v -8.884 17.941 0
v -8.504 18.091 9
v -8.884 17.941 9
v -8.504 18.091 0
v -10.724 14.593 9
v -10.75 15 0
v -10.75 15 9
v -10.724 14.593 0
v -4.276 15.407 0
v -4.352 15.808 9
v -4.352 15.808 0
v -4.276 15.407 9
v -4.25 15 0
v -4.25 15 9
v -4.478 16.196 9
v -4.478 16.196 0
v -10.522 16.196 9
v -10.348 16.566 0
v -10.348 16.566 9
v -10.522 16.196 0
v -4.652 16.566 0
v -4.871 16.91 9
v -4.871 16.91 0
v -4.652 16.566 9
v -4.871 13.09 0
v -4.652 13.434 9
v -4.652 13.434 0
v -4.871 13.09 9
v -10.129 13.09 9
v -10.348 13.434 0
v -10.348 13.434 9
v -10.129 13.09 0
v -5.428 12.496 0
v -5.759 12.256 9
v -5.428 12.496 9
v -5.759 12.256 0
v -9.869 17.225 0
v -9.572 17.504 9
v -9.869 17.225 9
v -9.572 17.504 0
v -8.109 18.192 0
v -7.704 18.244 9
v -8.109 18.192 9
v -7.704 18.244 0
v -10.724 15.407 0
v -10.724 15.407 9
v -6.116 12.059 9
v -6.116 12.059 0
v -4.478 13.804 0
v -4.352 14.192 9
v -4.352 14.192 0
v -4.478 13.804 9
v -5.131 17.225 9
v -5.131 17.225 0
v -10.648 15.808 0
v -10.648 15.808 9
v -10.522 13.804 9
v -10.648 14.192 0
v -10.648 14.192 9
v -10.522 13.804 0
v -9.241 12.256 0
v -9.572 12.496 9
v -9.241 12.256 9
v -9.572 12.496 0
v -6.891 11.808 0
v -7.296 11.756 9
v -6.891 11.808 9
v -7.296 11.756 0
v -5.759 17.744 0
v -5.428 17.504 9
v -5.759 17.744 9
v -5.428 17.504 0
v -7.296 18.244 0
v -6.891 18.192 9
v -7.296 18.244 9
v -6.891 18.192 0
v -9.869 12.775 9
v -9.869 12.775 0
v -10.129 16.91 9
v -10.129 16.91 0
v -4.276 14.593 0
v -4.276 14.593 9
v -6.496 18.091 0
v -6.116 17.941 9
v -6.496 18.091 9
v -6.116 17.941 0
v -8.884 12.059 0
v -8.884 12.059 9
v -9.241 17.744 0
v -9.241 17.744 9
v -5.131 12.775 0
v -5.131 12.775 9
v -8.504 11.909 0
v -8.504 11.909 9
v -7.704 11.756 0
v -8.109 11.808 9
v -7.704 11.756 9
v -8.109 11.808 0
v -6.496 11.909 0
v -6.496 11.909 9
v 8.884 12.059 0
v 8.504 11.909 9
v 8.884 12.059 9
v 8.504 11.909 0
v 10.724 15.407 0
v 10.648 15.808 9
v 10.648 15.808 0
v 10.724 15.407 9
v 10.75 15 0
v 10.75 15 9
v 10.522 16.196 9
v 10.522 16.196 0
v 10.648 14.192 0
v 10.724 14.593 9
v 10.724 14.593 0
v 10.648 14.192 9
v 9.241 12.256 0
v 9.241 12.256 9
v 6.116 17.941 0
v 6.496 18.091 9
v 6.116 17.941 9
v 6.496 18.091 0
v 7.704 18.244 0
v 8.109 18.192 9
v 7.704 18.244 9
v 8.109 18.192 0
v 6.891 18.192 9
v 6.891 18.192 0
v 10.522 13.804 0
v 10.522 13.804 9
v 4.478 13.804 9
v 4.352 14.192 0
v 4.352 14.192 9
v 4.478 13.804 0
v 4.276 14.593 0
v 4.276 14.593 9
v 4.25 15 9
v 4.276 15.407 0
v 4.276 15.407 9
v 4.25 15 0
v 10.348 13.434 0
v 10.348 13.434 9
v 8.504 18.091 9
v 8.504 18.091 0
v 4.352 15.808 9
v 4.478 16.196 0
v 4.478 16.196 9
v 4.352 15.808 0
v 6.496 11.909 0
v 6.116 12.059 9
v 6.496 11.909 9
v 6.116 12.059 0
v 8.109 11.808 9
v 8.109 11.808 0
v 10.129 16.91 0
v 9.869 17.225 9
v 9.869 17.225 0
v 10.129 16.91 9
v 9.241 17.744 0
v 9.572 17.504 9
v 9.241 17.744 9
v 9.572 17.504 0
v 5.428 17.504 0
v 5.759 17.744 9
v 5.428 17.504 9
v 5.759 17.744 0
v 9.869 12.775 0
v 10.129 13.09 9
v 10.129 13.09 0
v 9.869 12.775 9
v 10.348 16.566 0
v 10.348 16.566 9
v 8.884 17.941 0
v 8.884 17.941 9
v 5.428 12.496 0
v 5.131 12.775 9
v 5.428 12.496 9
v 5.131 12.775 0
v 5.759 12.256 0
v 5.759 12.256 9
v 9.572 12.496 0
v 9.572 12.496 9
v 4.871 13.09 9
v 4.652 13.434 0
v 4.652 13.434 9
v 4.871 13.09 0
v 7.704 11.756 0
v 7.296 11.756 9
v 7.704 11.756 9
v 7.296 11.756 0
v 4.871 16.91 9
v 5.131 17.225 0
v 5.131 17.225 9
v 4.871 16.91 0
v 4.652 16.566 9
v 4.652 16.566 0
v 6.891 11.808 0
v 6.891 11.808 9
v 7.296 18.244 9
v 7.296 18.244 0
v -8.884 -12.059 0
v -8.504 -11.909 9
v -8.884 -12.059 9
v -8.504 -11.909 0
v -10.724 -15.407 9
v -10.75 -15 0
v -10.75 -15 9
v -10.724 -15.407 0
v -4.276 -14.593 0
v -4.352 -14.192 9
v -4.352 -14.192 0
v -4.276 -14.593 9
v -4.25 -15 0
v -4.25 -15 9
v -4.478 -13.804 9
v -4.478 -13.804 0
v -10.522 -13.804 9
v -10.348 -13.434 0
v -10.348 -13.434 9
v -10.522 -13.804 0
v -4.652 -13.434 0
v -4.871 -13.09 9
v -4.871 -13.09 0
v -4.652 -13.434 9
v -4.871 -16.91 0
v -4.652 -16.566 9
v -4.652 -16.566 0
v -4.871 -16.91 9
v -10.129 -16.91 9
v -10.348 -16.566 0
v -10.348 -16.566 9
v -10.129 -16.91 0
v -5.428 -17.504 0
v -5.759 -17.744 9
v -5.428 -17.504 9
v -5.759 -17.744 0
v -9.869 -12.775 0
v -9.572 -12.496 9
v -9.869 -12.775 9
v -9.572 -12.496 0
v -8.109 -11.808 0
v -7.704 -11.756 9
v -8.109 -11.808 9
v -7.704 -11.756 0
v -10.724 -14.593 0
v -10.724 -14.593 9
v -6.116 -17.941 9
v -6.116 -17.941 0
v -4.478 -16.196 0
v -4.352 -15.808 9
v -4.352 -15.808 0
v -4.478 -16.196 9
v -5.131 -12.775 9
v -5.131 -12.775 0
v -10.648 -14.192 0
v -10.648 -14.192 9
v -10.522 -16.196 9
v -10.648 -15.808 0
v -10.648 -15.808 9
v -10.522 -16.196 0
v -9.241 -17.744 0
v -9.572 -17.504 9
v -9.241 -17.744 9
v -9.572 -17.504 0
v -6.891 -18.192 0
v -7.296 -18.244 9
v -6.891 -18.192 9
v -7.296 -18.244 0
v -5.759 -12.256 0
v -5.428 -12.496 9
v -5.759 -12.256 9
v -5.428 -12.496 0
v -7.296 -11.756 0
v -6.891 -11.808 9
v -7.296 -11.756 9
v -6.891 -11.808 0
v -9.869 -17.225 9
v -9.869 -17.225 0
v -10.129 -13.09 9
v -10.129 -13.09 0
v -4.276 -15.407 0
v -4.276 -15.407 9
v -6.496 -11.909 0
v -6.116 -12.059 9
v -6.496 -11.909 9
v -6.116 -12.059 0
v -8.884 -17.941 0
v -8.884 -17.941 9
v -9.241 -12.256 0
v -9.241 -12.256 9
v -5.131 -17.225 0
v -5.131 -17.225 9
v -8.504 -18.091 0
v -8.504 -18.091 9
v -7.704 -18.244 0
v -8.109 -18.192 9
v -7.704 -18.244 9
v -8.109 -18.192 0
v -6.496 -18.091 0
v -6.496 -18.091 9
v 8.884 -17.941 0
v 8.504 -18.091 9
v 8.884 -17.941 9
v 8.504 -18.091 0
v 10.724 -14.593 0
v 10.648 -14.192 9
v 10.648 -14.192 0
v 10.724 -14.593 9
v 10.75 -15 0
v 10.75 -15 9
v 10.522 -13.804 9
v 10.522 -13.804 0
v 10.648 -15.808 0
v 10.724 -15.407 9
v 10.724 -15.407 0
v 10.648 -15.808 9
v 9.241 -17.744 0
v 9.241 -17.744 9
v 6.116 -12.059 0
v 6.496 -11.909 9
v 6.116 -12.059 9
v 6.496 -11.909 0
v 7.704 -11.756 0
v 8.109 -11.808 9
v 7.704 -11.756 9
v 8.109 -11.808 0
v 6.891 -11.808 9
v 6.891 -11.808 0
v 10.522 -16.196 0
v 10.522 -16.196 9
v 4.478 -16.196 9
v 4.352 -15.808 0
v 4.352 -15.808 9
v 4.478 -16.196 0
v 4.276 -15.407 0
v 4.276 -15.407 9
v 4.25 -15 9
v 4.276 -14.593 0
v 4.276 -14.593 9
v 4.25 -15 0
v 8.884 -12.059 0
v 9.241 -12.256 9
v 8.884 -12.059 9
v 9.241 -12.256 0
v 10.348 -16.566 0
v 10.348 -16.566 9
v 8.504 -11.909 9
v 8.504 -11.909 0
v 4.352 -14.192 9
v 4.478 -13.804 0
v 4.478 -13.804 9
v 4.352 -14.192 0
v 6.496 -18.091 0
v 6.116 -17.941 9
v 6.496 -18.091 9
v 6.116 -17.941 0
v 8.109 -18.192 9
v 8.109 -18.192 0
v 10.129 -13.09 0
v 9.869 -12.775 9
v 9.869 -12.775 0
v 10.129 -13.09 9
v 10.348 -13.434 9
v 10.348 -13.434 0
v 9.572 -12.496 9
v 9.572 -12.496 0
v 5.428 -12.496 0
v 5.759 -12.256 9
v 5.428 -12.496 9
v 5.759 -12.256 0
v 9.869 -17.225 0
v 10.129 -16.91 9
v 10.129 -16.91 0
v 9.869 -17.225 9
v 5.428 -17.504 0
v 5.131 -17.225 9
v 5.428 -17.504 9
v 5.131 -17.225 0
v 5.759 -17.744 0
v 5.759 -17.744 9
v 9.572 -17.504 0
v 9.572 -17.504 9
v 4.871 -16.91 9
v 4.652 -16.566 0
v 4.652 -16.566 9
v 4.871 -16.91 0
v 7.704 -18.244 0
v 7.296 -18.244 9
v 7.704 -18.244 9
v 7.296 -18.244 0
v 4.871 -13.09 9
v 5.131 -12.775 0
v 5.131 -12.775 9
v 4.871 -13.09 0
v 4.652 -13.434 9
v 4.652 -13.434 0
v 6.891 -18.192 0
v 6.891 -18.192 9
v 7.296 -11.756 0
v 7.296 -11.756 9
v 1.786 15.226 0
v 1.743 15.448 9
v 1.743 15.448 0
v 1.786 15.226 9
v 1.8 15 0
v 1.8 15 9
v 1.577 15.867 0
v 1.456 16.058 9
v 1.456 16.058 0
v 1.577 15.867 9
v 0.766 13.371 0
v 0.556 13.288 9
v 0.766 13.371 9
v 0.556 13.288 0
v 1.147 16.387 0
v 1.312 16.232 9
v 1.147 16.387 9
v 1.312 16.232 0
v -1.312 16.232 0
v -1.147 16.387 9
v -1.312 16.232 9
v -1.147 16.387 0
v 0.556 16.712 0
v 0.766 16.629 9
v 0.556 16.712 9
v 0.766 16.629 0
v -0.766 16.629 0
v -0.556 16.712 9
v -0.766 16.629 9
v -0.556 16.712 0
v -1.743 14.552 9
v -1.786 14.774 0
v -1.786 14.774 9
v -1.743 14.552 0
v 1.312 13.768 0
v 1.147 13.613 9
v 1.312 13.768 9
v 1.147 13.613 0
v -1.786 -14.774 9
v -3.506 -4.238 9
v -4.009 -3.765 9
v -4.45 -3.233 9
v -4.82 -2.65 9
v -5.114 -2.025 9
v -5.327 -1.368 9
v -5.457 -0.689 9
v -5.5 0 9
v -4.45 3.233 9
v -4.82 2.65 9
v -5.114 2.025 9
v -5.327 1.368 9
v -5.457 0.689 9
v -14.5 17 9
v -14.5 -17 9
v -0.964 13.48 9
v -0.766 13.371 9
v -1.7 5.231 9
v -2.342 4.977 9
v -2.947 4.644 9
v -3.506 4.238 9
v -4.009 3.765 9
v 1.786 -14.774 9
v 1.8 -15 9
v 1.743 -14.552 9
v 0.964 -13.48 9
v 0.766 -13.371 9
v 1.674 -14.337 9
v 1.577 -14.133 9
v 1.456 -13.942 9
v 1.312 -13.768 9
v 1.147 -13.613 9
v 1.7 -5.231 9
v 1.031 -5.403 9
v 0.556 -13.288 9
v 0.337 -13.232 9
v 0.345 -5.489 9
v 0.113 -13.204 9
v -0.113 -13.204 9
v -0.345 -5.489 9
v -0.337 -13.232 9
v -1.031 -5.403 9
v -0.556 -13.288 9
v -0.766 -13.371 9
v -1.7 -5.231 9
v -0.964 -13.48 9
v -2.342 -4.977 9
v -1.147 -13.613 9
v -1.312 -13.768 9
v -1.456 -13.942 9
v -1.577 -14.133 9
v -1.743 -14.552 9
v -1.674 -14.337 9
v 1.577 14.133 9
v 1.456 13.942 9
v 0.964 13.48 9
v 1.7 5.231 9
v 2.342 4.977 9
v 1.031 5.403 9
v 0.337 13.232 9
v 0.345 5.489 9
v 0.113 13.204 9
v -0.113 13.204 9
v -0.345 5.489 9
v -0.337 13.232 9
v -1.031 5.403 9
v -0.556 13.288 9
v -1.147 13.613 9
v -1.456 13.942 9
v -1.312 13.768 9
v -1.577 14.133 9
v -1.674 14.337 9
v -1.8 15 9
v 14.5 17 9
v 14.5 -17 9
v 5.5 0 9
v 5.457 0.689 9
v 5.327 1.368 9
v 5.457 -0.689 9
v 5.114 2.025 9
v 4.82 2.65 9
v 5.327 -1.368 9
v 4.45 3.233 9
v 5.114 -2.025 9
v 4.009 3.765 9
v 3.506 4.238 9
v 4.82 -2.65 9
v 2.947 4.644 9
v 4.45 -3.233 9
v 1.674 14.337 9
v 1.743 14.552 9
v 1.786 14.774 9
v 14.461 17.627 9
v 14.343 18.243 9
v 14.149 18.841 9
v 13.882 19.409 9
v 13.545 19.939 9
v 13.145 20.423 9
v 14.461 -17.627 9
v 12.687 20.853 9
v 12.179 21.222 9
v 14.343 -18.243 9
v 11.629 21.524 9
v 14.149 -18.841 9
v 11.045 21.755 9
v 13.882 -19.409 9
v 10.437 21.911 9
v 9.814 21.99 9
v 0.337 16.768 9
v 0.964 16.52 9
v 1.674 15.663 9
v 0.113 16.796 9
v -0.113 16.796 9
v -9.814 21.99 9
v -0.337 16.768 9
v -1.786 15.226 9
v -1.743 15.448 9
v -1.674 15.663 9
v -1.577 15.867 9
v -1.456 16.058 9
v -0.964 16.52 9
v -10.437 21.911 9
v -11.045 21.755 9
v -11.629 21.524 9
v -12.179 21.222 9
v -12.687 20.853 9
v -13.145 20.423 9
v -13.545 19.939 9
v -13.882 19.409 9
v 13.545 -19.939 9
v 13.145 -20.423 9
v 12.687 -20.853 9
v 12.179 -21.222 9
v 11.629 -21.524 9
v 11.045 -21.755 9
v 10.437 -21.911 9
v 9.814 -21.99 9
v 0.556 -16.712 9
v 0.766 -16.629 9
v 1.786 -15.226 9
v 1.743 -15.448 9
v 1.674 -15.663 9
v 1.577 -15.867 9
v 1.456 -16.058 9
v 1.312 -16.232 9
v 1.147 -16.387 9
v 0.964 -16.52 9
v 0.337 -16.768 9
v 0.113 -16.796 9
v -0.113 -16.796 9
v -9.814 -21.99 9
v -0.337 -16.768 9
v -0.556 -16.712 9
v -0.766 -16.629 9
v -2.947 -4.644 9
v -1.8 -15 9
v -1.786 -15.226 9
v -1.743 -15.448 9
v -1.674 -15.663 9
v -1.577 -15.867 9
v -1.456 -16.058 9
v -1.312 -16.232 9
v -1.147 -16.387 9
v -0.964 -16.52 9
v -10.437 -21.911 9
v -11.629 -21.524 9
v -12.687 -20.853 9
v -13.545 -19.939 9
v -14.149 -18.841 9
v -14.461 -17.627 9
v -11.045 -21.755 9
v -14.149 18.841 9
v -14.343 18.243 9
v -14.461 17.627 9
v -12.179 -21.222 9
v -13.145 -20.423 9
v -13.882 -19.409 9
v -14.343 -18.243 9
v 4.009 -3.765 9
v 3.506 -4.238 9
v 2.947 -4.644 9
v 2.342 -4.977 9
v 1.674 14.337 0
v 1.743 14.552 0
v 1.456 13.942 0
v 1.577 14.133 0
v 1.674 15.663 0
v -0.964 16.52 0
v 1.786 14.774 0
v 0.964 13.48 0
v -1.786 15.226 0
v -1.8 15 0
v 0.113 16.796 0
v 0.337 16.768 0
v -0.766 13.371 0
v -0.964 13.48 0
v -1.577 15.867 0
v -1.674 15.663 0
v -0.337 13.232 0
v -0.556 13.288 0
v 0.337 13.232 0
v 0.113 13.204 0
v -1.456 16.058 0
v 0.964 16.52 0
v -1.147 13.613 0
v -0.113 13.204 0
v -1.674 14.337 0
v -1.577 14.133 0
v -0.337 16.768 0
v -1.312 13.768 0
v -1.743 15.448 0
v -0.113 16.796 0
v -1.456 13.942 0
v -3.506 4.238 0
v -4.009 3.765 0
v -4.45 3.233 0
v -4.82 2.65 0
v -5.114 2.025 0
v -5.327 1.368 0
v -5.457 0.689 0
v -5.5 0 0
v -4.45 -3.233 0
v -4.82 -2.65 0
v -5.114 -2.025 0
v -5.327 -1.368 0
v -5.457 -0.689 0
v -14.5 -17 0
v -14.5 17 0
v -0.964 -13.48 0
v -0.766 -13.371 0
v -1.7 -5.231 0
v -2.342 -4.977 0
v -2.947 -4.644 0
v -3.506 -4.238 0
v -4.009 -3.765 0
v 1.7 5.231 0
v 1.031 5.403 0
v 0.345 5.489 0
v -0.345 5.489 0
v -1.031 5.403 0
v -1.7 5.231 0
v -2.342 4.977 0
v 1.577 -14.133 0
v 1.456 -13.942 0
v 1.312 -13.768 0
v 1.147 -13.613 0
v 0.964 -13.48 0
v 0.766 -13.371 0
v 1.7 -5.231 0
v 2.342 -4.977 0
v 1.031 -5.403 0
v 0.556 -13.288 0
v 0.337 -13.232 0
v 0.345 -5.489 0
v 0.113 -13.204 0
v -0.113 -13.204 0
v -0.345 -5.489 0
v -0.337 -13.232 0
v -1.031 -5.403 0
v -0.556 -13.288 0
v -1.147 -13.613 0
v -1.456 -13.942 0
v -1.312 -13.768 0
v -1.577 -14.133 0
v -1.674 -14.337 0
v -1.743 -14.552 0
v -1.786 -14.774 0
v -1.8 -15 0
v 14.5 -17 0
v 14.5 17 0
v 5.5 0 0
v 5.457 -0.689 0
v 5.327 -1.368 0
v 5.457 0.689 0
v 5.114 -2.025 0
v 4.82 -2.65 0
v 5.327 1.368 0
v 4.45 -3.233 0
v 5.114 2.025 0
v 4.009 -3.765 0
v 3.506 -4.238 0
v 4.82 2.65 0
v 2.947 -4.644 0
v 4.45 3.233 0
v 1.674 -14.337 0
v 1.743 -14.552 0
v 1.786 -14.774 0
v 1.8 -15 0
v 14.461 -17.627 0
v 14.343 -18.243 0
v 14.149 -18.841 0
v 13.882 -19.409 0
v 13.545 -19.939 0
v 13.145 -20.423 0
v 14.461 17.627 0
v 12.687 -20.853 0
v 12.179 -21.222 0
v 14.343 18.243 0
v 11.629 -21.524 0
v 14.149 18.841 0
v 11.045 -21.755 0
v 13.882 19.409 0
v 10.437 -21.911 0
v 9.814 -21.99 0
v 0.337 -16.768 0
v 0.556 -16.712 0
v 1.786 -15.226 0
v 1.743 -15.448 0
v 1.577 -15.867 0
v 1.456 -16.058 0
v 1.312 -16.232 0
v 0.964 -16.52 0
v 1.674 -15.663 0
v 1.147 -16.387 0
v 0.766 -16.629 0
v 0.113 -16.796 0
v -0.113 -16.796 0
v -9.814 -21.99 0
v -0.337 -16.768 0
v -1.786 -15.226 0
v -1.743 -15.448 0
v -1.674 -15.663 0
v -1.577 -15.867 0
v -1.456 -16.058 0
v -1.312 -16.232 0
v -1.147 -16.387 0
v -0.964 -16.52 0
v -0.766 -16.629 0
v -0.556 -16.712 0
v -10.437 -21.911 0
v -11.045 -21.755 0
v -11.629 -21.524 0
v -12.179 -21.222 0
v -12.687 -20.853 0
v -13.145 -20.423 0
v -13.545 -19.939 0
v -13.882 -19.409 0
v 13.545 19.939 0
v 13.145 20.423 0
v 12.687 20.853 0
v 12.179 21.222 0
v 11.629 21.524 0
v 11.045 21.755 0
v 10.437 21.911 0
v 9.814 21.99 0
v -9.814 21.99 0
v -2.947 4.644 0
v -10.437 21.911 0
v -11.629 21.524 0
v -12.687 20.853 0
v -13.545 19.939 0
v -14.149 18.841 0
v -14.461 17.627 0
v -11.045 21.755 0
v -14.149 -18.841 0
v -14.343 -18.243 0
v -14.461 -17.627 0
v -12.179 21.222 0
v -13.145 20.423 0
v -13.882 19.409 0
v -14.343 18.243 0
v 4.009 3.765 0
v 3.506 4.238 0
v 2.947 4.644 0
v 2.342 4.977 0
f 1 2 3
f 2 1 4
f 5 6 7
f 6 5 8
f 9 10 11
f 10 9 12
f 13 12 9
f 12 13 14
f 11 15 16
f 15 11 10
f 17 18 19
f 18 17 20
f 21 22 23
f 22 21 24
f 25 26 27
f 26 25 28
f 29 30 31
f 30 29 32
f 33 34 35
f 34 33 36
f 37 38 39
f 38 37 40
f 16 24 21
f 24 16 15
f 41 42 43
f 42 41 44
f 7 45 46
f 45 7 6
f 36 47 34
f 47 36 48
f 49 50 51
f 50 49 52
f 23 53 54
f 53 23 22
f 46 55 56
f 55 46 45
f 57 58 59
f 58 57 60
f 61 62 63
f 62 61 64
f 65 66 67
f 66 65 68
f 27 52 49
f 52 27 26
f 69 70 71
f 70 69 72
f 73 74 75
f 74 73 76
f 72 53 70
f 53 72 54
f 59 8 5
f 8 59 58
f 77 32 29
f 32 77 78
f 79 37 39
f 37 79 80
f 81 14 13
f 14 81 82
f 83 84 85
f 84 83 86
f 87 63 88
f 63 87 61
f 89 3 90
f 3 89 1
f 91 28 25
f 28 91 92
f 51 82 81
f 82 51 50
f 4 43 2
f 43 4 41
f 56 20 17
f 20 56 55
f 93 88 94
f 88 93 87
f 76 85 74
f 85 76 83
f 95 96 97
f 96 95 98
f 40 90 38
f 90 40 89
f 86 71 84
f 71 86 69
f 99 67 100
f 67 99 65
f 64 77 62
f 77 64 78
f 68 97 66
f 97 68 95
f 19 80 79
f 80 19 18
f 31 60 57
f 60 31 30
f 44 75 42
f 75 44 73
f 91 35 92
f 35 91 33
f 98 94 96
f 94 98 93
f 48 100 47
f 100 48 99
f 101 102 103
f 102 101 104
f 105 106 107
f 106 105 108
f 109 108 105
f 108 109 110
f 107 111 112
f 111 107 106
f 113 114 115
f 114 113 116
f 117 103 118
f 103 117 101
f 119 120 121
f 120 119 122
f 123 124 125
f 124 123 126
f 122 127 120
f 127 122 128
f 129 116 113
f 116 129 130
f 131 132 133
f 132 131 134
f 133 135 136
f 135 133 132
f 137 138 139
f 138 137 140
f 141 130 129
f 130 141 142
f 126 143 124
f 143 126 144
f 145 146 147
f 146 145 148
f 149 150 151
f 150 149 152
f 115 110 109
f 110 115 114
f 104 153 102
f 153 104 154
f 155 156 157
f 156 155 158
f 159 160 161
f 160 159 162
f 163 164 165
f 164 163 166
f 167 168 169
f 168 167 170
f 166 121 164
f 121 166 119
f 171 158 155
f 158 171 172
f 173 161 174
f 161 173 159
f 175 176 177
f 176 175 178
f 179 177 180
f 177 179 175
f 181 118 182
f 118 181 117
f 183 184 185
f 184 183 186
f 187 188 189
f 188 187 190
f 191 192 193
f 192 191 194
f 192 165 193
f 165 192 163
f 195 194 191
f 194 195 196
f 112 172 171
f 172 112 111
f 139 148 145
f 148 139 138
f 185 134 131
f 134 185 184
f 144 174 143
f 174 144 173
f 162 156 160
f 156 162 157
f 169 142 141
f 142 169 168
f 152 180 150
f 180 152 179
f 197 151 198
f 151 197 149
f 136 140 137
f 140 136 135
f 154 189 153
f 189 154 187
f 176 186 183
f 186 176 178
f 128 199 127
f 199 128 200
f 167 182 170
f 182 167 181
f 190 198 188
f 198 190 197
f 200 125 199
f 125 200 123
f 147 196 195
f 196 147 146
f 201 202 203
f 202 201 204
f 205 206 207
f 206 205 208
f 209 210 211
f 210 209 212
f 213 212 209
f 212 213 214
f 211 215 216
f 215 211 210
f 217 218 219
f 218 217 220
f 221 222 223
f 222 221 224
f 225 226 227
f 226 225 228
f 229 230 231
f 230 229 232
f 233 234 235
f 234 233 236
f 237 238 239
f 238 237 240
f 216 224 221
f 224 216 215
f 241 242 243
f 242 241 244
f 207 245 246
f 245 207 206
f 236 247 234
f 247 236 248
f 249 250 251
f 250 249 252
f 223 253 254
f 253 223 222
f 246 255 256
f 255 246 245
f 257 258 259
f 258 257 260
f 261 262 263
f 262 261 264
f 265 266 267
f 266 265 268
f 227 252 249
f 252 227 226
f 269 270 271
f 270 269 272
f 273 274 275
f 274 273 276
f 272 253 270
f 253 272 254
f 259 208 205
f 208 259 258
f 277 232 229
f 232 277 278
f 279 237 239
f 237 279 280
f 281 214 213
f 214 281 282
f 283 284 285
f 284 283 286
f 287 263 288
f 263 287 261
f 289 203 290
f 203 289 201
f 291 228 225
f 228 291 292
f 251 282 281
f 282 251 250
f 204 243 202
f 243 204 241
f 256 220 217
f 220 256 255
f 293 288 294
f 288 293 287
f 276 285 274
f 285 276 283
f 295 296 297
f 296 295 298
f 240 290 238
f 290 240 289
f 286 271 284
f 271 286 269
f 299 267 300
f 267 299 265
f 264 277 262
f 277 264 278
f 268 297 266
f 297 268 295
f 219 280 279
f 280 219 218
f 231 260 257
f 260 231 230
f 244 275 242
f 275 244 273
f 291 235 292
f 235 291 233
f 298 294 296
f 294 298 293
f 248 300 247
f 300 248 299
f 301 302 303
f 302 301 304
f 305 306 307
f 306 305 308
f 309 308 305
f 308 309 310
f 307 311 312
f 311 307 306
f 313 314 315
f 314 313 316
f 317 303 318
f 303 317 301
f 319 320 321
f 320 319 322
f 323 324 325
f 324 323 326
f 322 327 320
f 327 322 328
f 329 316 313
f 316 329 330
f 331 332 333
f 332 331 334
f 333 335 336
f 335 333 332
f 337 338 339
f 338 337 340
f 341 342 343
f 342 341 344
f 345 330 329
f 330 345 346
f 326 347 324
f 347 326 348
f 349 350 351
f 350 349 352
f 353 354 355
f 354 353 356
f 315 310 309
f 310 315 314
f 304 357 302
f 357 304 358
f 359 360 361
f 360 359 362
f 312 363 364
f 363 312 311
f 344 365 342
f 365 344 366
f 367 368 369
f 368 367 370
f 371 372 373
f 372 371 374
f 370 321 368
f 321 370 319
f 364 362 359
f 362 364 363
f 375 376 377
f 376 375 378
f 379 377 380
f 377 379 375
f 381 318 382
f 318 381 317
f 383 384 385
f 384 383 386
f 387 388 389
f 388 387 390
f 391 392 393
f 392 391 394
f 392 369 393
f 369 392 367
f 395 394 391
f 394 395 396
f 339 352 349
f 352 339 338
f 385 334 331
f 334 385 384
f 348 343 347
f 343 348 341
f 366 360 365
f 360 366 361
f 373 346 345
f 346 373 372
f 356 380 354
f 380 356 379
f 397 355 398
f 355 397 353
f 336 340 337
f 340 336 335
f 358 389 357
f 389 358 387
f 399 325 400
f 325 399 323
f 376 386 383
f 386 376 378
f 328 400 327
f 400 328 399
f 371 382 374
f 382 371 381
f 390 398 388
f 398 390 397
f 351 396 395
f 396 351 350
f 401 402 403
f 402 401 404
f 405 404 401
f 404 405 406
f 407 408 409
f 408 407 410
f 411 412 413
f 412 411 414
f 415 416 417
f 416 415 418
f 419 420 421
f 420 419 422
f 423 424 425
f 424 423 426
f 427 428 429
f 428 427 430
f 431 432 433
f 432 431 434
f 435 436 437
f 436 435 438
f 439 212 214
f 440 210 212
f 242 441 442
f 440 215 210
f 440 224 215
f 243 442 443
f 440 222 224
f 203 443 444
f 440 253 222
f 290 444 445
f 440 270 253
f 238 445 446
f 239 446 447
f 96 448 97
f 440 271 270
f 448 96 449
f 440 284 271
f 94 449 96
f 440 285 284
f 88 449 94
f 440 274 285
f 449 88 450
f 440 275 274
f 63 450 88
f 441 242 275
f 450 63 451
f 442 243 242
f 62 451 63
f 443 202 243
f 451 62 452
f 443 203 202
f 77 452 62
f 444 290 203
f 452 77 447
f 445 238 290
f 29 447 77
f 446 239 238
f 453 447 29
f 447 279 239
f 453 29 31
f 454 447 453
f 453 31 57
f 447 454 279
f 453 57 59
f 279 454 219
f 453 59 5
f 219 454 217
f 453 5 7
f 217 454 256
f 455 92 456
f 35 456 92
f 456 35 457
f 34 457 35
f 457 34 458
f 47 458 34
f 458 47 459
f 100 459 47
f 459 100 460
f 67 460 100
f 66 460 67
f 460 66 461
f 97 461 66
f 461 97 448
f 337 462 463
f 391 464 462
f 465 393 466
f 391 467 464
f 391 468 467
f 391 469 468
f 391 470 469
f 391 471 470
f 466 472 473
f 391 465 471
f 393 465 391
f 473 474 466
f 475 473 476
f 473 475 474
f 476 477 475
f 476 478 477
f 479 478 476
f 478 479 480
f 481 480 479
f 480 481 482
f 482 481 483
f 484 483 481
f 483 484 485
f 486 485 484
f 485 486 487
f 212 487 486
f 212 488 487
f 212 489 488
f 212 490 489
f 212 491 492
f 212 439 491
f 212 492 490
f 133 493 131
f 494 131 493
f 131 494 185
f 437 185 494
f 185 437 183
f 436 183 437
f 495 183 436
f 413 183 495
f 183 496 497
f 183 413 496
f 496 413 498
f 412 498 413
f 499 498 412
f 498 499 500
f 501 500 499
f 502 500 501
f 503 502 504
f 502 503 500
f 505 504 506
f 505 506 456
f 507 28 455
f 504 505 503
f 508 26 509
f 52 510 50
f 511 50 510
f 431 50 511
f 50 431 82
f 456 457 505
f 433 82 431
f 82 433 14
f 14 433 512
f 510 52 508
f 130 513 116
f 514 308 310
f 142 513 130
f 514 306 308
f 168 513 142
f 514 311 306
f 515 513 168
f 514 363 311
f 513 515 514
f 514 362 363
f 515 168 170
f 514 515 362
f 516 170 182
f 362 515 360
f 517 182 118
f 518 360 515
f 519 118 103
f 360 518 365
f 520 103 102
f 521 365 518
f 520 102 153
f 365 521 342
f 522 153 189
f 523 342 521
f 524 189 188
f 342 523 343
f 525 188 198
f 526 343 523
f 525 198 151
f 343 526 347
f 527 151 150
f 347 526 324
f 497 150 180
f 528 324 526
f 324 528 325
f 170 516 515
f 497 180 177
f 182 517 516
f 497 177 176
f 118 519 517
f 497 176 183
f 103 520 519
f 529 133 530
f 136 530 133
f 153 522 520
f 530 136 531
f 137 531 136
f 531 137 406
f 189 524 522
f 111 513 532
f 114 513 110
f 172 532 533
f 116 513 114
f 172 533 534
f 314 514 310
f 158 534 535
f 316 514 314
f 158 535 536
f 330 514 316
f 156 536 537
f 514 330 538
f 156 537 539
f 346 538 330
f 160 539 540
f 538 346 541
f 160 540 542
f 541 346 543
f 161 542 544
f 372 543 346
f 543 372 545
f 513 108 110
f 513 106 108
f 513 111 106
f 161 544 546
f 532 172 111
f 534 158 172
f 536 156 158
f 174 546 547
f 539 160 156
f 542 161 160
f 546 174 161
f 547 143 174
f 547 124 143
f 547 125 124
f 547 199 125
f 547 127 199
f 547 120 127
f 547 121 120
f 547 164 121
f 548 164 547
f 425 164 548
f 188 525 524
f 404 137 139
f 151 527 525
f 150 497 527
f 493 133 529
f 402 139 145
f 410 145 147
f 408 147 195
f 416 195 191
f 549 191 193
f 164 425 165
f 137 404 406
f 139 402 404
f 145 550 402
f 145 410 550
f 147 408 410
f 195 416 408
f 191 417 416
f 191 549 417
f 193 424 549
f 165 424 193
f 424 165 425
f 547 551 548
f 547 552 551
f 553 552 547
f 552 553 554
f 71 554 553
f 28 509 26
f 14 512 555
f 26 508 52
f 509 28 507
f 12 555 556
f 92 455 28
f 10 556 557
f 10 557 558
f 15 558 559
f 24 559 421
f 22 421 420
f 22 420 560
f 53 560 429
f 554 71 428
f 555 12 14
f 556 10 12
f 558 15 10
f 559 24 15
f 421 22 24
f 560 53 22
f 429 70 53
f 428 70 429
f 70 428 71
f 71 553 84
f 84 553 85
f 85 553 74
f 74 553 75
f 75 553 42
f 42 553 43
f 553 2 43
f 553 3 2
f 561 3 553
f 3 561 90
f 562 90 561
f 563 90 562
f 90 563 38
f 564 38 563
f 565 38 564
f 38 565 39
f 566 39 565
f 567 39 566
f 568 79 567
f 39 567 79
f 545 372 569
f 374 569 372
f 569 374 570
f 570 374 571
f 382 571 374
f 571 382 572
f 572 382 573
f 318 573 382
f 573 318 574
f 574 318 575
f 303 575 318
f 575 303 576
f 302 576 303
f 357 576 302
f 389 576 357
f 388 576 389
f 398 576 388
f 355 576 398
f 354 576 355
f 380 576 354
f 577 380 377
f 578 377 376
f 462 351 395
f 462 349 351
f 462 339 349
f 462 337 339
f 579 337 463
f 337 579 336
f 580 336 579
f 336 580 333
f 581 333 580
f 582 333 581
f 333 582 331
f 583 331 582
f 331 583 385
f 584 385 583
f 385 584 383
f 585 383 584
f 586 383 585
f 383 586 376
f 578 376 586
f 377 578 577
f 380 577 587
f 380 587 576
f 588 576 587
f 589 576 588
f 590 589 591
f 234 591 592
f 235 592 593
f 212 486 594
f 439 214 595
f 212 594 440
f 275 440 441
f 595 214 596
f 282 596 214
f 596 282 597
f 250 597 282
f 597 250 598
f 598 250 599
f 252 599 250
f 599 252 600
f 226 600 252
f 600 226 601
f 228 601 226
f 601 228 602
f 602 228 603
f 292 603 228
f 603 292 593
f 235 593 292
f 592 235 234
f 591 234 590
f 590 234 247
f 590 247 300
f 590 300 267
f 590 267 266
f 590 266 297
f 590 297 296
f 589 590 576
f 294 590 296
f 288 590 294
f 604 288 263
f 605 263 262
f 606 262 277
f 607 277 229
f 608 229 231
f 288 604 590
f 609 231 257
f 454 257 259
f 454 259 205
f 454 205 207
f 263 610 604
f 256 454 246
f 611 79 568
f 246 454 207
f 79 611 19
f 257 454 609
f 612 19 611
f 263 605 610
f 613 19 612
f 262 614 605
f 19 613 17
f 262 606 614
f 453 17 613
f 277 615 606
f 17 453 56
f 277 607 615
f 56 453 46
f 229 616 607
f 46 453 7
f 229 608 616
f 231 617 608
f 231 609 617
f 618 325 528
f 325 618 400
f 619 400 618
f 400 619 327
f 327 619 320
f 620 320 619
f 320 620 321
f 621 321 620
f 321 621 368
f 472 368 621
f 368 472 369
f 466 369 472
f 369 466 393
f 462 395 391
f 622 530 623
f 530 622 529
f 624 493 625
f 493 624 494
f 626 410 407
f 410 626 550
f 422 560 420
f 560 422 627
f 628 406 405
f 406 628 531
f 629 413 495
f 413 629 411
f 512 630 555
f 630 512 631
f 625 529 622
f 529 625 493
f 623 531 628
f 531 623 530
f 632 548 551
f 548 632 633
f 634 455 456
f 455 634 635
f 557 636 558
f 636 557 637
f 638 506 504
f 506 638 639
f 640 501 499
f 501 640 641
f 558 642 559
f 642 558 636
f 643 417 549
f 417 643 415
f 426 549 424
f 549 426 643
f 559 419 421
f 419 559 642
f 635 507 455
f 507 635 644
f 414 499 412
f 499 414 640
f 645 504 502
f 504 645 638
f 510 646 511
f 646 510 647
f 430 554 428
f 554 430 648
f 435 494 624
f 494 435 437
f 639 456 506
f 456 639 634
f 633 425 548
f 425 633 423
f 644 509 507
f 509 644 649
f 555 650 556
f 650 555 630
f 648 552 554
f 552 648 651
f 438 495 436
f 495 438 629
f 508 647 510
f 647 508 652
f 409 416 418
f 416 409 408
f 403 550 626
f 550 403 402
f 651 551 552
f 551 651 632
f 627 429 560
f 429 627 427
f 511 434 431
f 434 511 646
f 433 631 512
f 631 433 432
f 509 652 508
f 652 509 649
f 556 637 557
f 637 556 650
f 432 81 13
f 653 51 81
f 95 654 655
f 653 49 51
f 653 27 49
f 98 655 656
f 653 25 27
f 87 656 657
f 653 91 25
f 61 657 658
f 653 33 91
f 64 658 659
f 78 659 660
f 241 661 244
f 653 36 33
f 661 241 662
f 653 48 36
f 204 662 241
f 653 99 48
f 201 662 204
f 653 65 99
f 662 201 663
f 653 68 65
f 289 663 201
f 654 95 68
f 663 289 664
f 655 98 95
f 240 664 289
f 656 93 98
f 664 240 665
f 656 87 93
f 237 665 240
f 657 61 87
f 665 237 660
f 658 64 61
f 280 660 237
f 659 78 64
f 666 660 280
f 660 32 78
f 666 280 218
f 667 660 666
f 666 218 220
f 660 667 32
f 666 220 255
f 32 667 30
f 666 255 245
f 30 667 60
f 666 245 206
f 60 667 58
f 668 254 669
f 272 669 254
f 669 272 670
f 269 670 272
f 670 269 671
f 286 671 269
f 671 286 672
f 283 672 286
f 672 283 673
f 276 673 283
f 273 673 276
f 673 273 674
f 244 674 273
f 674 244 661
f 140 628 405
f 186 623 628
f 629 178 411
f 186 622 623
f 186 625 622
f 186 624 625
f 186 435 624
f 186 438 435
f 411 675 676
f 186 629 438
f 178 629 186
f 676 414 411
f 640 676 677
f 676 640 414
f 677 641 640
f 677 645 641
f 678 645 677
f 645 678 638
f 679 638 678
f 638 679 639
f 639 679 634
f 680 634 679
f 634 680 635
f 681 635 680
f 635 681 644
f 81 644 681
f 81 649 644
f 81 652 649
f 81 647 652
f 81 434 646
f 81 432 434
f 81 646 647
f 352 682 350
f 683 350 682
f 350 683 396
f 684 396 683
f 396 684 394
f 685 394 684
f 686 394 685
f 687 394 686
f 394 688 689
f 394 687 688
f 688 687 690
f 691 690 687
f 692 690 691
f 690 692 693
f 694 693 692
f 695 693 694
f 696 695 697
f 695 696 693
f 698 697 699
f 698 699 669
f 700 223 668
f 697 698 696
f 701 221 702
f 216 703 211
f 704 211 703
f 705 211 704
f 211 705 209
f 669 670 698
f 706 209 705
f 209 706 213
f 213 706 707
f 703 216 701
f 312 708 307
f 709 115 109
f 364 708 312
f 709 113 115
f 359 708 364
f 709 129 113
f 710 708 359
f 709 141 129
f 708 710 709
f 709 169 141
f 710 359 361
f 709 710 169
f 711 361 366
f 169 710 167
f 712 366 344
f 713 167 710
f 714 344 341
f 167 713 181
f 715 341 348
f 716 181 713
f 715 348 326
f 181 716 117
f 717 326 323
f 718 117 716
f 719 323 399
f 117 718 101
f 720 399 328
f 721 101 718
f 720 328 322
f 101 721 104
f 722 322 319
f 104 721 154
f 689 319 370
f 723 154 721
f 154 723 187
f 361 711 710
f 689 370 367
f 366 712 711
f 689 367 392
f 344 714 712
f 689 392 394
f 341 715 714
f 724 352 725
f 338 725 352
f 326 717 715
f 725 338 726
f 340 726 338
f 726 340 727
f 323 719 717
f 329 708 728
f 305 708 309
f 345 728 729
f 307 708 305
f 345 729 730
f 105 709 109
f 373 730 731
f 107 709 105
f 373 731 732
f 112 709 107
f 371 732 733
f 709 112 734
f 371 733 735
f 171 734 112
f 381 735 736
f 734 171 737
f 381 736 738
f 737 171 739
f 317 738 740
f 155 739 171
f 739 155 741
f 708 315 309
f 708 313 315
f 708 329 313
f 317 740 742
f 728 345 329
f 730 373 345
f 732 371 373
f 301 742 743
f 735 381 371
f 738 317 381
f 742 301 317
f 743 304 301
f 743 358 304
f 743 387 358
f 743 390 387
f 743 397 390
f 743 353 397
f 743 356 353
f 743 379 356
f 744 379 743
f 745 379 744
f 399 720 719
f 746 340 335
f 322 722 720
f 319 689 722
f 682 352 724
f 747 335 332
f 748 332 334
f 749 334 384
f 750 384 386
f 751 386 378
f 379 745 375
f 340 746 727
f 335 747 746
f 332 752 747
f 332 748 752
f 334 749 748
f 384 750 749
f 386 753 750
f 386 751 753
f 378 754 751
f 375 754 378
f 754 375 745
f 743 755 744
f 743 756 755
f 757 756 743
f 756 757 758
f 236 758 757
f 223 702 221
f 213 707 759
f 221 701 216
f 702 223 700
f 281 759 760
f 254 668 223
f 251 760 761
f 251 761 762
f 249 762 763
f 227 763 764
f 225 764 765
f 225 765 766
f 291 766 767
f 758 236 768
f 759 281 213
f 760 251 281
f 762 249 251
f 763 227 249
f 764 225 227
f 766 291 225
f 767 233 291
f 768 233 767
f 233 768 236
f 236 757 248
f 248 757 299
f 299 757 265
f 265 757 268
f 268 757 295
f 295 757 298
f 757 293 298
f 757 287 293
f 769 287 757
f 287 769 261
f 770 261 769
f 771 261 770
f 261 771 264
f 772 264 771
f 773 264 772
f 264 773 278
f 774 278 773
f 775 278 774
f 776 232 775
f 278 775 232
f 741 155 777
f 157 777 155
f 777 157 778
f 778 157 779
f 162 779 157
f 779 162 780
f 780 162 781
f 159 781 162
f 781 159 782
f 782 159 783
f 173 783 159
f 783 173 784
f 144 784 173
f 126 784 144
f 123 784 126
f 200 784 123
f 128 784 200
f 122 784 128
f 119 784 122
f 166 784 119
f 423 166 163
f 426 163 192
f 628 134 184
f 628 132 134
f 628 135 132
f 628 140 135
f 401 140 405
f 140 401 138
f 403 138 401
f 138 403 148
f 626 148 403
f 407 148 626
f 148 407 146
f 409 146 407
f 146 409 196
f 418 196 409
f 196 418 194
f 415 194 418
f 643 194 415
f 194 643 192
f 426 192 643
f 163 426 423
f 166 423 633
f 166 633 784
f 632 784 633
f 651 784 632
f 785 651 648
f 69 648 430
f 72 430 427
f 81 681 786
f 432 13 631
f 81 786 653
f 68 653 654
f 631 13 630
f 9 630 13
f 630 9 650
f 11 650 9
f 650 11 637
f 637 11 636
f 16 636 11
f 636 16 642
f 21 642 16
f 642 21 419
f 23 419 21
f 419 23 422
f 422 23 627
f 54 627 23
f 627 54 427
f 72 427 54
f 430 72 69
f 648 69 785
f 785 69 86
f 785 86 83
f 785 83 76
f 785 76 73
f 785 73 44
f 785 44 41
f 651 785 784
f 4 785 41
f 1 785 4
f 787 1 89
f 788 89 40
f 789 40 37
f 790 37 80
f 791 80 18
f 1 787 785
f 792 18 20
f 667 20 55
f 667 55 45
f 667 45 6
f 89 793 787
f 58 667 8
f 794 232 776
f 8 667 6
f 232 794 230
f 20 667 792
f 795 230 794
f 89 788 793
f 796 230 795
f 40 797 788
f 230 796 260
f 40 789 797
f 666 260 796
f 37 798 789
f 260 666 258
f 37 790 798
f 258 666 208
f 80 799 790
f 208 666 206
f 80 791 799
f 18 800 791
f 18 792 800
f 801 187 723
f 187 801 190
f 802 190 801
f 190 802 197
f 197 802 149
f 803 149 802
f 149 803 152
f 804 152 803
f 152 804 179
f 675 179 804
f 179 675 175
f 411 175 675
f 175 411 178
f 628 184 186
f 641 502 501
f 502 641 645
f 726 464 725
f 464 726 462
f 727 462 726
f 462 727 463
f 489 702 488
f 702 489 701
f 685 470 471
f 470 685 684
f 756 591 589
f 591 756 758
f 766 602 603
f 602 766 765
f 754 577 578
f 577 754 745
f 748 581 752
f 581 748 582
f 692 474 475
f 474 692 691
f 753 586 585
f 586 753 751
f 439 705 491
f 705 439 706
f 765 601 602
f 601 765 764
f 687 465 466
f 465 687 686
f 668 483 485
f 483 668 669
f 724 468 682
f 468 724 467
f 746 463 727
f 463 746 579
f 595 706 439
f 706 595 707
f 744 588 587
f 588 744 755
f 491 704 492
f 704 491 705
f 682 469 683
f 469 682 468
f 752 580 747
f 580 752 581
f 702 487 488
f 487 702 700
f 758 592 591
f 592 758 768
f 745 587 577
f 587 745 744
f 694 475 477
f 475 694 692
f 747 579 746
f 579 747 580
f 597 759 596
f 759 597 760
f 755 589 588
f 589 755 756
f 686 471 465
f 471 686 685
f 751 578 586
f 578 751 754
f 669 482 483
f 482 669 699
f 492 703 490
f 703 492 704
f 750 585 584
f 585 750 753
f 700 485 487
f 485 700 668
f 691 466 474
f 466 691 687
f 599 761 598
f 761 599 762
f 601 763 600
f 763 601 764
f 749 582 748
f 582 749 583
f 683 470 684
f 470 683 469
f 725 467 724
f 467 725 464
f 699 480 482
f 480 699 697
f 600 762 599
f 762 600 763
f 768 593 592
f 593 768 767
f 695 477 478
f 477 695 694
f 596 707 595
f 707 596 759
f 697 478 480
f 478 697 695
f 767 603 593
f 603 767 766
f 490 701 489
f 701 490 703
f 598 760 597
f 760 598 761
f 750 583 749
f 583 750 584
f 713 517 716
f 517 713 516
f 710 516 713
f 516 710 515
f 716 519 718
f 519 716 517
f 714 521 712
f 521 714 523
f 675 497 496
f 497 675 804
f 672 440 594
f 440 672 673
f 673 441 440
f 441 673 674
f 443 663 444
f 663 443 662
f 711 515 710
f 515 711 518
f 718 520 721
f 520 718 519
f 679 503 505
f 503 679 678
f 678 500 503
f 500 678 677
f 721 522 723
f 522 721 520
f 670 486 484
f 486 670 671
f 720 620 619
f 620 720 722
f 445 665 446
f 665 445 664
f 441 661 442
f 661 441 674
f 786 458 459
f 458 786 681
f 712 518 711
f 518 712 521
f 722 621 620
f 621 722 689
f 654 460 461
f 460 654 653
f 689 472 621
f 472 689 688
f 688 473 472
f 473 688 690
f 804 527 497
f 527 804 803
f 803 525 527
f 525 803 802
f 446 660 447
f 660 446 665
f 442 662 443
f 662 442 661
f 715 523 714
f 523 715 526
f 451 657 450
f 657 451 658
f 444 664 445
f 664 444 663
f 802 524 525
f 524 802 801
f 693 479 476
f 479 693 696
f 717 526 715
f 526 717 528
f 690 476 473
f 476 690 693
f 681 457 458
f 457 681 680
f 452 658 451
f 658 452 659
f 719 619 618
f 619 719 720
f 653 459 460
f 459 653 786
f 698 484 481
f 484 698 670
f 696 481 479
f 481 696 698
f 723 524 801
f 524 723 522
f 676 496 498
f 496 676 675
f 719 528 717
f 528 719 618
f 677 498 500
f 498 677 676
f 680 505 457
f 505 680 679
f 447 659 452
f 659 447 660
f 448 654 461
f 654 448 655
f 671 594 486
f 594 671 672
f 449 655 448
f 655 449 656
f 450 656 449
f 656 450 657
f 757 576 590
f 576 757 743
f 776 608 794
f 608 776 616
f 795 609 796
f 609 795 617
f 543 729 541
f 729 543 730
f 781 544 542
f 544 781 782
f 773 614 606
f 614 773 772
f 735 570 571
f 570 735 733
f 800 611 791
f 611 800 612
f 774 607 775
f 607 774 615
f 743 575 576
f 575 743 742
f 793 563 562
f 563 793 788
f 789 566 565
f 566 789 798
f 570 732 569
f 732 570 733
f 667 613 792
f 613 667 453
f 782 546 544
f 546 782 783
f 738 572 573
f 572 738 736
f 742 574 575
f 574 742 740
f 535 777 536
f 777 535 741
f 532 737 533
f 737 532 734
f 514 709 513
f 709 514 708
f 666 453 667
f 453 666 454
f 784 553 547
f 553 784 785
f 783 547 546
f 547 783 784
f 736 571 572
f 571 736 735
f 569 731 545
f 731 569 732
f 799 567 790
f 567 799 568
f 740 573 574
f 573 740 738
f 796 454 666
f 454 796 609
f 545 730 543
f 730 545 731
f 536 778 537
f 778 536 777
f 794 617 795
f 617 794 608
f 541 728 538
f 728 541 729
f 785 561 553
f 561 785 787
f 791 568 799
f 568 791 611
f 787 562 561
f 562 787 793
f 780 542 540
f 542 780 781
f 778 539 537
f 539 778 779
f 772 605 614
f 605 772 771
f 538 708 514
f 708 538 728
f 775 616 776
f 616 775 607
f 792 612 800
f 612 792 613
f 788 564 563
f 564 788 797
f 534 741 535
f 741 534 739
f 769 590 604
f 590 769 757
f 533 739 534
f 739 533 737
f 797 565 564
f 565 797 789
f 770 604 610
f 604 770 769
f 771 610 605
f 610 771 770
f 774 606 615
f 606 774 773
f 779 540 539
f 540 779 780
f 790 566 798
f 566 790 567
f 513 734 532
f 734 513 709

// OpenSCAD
$fn = 50;


difference() {
	union() {
		hull() {
			translate(v = [-9.5000000000, 17.0000000000, 0]) {
				cylinder(h = 9, r = 5);
			}
			translate(v = [9.5000000000, 17.0000000000, 0]) {
				cylinder(h = 9, r = 5);
			}
			translate(v = [-9.5000000000, -17.0000000000, 0]) {
				cylinder(h = 9, r = 5);
			}
			translate(v = [9.5000000000, -17.0000000000, 0]) {
				cylinder(h = 9, r = 5);
			}
		}
	}
	union() {
		#translate(v = [-7.5000000000, 15.0000000000, 0]) {
			cylinder(h = 9, r = 3.2500000000);
		}
		#translate(v = [7.5000000000, 15.0000000000, 0]) {
			cylinder(h = 9, r = 3.2500000000);
		}
		#translate(v = [-7.5000000000, -15.0000000000, 0]) {
			cylinder(h = 9, r = 3.2500000000);
		}
		#translate(v = [7.5000000000, -15.0000000000, 0]) {
			cylinder(h = 9, r = 3.2500000000);
		}
		#translate(v = [-7.5000000000, -15.0000000000, -100.0000000000]) {
			cylinder(h = 200, r = 3.2500000000);
		}
		#translate(v = [-7.5000000000, 15.0000000000, -100.0000000000]) {
			cylinder(h = 200, r = 3.2500000000);
		}
		#translate(v = [7.5000000000, -15.0000000000, -100.0000000000]) {
			cylinder(h = 200, r = 3.2500000000);
		}
		#translate(v = [7.5000000000, 15.0000000000, -100.0000000000]) {
			cylinder(h = 200, r = 3.2500000000);
		}
		#translate(v = [-7.5000000000, 15.0000000000, 0]) {
			cylinder(h = 9, r = 1.8000000000);
		}
		#translate(v = [0.0000000000, 15.0000000000, 0]) {
			cylinder(h = 9, r = 1.8000000000);
		}
		#translate(v = [7.5000000000, 15.0000000000, 0]) {
			cylinder(h = 9, r = 1.8000000000);
		}
		#translate(v = [-7.5000000000, -15.0000000000, 0]) {
			cylinder(h = 9, r = 1.8000000000);
		}
		#translate(v = [0.0000000000, -15.0000000000, 0]) {
			cylinder(h = 9, r = 1.8000000000);
		}
		#translate(v = [7.5000000000, -15.0000000000, 0]) {
			cylinder(h = 9, r = 1.8000000000);
		}
		#translate(v = [-7.5000000000, 15.0000000000, 0]) {
			cylinder(h = 9, r = 1.8000000000);
		}
		#translate(v = [0.0000000000, 15.0000000000, 0]) {
			cylinder(h = 9, r = 1.8000000000);
		}
		#translate(v = [7.5000000000, 15.0000000000, 0]) {
			cylinder(h = 9, r = 1.8000000000);
		}
		#translate(v = [-7.5000000000, -15.0000000000, 0]) {
			cylinder(h = 9, r = 1.8000000000);
		}
		#translate(v = [0.0000000000, -15.0000000000, 0]) {
			cylinder(h = 9, r = 1.8000000000);
		}
		#translate(v = [7.5000000000, -15.0000000000, 0]) {
			cylinder(h = 9, r = 1.8000000000);
		}
		#translate(v = [-7.5000000000, 15.0000000000, 0]) {
			cylinder(h = 9, r = 1.8000000000);
		}
		#translate(v = [0.0000000000, 15.0000000000, 0]) {
			cylinder(h = 9, r = 1.8000000000);
		}
		#translate(v = [7.5000000000, 15.0000000000, 0]) {
			cylinder(h = 9, r = 1.8000000000);
		}
		#translate(v = [-7.5000000000, -15.0000000000, 0]) {
			cylinder(h = 9, r = 1.8000000000);
		}
		#translate(v = [0.0000000000, -15.0000000000, 0]) {
			cylinder(h = 9, r = 1.8000000000);
		}
		#translate(v = [7.5000000000, -15.0000000000, 0]) {
			cylinder(h = 9, r = 1.8000000000);
		}
		#cylinder(h = 9, r = 5.5000000000);
	}
}
